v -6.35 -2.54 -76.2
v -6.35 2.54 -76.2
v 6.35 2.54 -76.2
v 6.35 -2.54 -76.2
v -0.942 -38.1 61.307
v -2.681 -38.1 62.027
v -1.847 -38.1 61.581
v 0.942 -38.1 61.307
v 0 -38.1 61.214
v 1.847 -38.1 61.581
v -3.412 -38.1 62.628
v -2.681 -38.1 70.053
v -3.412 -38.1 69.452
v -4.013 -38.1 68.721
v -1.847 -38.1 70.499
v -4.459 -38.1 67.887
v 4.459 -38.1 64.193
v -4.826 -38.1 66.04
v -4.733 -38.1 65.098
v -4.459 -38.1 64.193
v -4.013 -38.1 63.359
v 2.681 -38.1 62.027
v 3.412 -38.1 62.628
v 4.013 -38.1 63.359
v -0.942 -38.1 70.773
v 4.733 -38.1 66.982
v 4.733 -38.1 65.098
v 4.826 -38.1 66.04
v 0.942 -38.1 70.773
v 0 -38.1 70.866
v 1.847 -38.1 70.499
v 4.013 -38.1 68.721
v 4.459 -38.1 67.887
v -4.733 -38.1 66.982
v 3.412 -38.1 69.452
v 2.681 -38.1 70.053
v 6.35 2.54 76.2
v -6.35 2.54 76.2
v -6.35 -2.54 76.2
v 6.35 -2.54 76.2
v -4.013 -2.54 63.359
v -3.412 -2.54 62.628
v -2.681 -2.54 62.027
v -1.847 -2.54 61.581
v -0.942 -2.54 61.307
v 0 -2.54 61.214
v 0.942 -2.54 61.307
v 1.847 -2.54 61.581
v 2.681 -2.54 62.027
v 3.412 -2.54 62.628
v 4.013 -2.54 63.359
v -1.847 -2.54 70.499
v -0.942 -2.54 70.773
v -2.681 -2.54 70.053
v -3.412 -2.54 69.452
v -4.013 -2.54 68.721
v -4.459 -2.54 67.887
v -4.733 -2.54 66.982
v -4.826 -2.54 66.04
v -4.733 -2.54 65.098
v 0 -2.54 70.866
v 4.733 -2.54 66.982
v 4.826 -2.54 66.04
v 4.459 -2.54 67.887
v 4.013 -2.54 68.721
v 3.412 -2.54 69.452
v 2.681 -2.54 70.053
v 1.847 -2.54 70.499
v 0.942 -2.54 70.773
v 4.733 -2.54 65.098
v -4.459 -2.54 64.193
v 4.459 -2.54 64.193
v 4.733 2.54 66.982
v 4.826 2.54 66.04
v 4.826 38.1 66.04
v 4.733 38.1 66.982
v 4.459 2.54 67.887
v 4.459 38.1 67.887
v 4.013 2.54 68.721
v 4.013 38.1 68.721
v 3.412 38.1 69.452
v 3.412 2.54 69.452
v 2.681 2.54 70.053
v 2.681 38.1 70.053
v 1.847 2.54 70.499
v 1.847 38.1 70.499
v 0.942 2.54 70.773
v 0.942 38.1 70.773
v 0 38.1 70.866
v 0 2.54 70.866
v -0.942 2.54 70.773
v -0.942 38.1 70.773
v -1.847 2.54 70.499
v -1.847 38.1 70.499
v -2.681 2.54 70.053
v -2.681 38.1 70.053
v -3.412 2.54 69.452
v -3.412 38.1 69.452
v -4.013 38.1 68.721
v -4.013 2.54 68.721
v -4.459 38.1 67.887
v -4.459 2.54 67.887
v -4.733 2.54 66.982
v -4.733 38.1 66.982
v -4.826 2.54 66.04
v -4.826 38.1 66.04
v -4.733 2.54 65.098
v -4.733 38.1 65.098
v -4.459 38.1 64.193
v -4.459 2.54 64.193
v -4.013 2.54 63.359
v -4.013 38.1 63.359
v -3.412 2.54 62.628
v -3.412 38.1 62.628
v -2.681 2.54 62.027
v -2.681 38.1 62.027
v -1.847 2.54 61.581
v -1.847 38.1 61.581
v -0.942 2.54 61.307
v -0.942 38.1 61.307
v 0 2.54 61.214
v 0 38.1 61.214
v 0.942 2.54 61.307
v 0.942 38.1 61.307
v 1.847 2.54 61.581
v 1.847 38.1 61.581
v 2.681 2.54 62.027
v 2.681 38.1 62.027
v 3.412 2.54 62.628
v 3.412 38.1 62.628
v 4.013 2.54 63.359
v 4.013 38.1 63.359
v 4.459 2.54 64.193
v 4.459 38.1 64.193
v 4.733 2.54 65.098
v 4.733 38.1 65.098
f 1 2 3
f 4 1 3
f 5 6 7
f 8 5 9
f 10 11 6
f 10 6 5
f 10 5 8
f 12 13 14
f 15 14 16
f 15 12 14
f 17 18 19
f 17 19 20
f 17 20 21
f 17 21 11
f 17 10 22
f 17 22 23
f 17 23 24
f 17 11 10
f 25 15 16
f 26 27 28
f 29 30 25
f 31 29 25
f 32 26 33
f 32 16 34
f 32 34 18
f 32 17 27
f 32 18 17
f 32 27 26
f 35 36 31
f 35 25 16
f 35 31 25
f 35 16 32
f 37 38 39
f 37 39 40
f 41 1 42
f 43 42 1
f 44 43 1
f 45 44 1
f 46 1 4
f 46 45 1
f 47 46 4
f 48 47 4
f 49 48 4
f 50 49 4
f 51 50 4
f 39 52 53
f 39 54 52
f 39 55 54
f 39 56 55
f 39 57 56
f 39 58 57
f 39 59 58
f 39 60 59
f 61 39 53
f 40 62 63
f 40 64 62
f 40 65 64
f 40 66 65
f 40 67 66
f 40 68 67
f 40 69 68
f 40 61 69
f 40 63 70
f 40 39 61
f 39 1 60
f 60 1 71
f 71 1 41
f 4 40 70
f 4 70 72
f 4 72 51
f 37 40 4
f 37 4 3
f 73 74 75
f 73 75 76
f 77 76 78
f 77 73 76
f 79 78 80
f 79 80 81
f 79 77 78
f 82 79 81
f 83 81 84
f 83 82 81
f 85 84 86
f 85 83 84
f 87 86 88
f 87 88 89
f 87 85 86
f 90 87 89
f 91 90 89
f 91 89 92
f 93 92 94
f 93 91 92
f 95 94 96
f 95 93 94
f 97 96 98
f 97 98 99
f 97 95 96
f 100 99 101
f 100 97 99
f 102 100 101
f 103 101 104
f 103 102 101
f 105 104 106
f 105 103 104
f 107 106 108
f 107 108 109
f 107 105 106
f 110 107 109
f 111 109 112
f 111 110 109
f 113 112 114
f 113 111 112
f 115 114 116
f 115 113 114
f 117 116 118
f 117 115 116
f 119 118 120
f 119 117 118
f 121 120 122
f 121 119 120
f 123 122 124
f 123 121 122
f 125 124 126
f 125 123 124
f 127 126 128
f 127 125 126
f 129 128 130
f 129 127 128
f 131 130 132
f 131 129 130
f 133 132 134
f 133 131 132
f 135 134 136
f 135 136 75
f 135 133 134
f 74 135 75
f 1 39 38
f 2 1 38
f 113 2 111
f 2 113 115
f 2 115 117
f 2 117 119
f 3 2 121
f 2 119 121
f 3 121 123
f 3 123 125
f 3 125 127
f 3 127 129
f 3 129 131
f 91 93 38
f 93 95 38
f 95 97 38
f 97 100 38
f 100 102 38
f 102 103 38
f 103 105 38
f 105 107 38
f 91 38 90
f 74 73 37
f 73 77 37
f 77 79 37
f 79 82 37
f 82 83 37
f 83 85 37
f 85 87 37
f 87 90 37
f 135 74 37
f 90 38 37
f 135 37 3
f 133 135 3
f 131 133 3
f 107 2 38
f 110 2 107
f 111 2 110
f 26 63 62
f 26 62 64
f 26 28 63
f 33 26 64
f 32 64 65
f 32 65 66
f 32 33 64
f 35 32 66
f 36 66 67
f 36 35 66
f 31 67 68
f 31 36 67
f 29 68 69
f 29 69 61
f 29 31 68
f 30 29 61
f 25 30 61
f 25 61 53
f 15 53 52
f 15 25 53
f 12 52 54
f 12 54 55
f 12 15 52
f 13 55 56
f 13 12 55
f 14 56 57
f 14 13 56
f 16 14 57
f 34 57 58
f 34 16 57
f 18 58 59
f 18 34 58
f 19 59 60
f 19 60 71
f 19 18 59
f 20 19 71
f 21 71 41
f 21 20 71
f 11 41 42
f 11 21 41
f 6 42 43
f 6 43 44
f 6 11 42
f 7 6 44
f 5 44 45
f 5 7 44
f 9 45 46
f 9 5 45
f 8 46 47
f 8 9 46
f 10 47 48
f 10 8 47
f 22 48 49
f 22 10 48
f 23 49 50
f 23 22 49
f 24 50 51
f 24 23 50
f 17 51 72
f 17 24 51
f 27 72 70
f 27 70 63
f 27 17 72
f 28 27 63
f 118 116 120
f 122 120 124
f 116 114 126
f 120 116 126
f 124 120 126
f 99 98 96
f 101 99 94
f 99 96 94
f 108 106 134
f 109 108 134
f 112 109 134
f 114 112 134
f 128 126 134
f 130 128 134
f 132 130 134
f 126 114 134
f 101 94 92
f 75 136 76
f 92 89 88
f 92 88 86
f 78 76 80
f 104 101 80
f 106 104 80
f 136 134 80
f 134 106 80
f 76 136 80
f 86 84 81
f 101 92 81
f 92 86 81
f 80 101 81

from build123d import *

# Parameters (mm, degrees)
F0_W     = 12.7
F0_H     = 5.08
F1_DEPTH = 76.2
F2_R     = 4.826
F3_DEPTH = 38.1


with BuildPart() as f1:
    # F0 (on Top) → F1 (new body, symmetric)
    with BuildSketch(Plane.XY):
        Rectangle(F0_W, F0_H)
    extrude(amount=F1_DEPTH, both=True)

    # F2 (on Front) → F3 (join, symmetric)
    with BuildSketch(Plane.XZ):
        with Locations((0, 66.04)):
            Circle(F2_R)
    extrude(amount=F3_DEPTH, both=True)


solid = f1.part
